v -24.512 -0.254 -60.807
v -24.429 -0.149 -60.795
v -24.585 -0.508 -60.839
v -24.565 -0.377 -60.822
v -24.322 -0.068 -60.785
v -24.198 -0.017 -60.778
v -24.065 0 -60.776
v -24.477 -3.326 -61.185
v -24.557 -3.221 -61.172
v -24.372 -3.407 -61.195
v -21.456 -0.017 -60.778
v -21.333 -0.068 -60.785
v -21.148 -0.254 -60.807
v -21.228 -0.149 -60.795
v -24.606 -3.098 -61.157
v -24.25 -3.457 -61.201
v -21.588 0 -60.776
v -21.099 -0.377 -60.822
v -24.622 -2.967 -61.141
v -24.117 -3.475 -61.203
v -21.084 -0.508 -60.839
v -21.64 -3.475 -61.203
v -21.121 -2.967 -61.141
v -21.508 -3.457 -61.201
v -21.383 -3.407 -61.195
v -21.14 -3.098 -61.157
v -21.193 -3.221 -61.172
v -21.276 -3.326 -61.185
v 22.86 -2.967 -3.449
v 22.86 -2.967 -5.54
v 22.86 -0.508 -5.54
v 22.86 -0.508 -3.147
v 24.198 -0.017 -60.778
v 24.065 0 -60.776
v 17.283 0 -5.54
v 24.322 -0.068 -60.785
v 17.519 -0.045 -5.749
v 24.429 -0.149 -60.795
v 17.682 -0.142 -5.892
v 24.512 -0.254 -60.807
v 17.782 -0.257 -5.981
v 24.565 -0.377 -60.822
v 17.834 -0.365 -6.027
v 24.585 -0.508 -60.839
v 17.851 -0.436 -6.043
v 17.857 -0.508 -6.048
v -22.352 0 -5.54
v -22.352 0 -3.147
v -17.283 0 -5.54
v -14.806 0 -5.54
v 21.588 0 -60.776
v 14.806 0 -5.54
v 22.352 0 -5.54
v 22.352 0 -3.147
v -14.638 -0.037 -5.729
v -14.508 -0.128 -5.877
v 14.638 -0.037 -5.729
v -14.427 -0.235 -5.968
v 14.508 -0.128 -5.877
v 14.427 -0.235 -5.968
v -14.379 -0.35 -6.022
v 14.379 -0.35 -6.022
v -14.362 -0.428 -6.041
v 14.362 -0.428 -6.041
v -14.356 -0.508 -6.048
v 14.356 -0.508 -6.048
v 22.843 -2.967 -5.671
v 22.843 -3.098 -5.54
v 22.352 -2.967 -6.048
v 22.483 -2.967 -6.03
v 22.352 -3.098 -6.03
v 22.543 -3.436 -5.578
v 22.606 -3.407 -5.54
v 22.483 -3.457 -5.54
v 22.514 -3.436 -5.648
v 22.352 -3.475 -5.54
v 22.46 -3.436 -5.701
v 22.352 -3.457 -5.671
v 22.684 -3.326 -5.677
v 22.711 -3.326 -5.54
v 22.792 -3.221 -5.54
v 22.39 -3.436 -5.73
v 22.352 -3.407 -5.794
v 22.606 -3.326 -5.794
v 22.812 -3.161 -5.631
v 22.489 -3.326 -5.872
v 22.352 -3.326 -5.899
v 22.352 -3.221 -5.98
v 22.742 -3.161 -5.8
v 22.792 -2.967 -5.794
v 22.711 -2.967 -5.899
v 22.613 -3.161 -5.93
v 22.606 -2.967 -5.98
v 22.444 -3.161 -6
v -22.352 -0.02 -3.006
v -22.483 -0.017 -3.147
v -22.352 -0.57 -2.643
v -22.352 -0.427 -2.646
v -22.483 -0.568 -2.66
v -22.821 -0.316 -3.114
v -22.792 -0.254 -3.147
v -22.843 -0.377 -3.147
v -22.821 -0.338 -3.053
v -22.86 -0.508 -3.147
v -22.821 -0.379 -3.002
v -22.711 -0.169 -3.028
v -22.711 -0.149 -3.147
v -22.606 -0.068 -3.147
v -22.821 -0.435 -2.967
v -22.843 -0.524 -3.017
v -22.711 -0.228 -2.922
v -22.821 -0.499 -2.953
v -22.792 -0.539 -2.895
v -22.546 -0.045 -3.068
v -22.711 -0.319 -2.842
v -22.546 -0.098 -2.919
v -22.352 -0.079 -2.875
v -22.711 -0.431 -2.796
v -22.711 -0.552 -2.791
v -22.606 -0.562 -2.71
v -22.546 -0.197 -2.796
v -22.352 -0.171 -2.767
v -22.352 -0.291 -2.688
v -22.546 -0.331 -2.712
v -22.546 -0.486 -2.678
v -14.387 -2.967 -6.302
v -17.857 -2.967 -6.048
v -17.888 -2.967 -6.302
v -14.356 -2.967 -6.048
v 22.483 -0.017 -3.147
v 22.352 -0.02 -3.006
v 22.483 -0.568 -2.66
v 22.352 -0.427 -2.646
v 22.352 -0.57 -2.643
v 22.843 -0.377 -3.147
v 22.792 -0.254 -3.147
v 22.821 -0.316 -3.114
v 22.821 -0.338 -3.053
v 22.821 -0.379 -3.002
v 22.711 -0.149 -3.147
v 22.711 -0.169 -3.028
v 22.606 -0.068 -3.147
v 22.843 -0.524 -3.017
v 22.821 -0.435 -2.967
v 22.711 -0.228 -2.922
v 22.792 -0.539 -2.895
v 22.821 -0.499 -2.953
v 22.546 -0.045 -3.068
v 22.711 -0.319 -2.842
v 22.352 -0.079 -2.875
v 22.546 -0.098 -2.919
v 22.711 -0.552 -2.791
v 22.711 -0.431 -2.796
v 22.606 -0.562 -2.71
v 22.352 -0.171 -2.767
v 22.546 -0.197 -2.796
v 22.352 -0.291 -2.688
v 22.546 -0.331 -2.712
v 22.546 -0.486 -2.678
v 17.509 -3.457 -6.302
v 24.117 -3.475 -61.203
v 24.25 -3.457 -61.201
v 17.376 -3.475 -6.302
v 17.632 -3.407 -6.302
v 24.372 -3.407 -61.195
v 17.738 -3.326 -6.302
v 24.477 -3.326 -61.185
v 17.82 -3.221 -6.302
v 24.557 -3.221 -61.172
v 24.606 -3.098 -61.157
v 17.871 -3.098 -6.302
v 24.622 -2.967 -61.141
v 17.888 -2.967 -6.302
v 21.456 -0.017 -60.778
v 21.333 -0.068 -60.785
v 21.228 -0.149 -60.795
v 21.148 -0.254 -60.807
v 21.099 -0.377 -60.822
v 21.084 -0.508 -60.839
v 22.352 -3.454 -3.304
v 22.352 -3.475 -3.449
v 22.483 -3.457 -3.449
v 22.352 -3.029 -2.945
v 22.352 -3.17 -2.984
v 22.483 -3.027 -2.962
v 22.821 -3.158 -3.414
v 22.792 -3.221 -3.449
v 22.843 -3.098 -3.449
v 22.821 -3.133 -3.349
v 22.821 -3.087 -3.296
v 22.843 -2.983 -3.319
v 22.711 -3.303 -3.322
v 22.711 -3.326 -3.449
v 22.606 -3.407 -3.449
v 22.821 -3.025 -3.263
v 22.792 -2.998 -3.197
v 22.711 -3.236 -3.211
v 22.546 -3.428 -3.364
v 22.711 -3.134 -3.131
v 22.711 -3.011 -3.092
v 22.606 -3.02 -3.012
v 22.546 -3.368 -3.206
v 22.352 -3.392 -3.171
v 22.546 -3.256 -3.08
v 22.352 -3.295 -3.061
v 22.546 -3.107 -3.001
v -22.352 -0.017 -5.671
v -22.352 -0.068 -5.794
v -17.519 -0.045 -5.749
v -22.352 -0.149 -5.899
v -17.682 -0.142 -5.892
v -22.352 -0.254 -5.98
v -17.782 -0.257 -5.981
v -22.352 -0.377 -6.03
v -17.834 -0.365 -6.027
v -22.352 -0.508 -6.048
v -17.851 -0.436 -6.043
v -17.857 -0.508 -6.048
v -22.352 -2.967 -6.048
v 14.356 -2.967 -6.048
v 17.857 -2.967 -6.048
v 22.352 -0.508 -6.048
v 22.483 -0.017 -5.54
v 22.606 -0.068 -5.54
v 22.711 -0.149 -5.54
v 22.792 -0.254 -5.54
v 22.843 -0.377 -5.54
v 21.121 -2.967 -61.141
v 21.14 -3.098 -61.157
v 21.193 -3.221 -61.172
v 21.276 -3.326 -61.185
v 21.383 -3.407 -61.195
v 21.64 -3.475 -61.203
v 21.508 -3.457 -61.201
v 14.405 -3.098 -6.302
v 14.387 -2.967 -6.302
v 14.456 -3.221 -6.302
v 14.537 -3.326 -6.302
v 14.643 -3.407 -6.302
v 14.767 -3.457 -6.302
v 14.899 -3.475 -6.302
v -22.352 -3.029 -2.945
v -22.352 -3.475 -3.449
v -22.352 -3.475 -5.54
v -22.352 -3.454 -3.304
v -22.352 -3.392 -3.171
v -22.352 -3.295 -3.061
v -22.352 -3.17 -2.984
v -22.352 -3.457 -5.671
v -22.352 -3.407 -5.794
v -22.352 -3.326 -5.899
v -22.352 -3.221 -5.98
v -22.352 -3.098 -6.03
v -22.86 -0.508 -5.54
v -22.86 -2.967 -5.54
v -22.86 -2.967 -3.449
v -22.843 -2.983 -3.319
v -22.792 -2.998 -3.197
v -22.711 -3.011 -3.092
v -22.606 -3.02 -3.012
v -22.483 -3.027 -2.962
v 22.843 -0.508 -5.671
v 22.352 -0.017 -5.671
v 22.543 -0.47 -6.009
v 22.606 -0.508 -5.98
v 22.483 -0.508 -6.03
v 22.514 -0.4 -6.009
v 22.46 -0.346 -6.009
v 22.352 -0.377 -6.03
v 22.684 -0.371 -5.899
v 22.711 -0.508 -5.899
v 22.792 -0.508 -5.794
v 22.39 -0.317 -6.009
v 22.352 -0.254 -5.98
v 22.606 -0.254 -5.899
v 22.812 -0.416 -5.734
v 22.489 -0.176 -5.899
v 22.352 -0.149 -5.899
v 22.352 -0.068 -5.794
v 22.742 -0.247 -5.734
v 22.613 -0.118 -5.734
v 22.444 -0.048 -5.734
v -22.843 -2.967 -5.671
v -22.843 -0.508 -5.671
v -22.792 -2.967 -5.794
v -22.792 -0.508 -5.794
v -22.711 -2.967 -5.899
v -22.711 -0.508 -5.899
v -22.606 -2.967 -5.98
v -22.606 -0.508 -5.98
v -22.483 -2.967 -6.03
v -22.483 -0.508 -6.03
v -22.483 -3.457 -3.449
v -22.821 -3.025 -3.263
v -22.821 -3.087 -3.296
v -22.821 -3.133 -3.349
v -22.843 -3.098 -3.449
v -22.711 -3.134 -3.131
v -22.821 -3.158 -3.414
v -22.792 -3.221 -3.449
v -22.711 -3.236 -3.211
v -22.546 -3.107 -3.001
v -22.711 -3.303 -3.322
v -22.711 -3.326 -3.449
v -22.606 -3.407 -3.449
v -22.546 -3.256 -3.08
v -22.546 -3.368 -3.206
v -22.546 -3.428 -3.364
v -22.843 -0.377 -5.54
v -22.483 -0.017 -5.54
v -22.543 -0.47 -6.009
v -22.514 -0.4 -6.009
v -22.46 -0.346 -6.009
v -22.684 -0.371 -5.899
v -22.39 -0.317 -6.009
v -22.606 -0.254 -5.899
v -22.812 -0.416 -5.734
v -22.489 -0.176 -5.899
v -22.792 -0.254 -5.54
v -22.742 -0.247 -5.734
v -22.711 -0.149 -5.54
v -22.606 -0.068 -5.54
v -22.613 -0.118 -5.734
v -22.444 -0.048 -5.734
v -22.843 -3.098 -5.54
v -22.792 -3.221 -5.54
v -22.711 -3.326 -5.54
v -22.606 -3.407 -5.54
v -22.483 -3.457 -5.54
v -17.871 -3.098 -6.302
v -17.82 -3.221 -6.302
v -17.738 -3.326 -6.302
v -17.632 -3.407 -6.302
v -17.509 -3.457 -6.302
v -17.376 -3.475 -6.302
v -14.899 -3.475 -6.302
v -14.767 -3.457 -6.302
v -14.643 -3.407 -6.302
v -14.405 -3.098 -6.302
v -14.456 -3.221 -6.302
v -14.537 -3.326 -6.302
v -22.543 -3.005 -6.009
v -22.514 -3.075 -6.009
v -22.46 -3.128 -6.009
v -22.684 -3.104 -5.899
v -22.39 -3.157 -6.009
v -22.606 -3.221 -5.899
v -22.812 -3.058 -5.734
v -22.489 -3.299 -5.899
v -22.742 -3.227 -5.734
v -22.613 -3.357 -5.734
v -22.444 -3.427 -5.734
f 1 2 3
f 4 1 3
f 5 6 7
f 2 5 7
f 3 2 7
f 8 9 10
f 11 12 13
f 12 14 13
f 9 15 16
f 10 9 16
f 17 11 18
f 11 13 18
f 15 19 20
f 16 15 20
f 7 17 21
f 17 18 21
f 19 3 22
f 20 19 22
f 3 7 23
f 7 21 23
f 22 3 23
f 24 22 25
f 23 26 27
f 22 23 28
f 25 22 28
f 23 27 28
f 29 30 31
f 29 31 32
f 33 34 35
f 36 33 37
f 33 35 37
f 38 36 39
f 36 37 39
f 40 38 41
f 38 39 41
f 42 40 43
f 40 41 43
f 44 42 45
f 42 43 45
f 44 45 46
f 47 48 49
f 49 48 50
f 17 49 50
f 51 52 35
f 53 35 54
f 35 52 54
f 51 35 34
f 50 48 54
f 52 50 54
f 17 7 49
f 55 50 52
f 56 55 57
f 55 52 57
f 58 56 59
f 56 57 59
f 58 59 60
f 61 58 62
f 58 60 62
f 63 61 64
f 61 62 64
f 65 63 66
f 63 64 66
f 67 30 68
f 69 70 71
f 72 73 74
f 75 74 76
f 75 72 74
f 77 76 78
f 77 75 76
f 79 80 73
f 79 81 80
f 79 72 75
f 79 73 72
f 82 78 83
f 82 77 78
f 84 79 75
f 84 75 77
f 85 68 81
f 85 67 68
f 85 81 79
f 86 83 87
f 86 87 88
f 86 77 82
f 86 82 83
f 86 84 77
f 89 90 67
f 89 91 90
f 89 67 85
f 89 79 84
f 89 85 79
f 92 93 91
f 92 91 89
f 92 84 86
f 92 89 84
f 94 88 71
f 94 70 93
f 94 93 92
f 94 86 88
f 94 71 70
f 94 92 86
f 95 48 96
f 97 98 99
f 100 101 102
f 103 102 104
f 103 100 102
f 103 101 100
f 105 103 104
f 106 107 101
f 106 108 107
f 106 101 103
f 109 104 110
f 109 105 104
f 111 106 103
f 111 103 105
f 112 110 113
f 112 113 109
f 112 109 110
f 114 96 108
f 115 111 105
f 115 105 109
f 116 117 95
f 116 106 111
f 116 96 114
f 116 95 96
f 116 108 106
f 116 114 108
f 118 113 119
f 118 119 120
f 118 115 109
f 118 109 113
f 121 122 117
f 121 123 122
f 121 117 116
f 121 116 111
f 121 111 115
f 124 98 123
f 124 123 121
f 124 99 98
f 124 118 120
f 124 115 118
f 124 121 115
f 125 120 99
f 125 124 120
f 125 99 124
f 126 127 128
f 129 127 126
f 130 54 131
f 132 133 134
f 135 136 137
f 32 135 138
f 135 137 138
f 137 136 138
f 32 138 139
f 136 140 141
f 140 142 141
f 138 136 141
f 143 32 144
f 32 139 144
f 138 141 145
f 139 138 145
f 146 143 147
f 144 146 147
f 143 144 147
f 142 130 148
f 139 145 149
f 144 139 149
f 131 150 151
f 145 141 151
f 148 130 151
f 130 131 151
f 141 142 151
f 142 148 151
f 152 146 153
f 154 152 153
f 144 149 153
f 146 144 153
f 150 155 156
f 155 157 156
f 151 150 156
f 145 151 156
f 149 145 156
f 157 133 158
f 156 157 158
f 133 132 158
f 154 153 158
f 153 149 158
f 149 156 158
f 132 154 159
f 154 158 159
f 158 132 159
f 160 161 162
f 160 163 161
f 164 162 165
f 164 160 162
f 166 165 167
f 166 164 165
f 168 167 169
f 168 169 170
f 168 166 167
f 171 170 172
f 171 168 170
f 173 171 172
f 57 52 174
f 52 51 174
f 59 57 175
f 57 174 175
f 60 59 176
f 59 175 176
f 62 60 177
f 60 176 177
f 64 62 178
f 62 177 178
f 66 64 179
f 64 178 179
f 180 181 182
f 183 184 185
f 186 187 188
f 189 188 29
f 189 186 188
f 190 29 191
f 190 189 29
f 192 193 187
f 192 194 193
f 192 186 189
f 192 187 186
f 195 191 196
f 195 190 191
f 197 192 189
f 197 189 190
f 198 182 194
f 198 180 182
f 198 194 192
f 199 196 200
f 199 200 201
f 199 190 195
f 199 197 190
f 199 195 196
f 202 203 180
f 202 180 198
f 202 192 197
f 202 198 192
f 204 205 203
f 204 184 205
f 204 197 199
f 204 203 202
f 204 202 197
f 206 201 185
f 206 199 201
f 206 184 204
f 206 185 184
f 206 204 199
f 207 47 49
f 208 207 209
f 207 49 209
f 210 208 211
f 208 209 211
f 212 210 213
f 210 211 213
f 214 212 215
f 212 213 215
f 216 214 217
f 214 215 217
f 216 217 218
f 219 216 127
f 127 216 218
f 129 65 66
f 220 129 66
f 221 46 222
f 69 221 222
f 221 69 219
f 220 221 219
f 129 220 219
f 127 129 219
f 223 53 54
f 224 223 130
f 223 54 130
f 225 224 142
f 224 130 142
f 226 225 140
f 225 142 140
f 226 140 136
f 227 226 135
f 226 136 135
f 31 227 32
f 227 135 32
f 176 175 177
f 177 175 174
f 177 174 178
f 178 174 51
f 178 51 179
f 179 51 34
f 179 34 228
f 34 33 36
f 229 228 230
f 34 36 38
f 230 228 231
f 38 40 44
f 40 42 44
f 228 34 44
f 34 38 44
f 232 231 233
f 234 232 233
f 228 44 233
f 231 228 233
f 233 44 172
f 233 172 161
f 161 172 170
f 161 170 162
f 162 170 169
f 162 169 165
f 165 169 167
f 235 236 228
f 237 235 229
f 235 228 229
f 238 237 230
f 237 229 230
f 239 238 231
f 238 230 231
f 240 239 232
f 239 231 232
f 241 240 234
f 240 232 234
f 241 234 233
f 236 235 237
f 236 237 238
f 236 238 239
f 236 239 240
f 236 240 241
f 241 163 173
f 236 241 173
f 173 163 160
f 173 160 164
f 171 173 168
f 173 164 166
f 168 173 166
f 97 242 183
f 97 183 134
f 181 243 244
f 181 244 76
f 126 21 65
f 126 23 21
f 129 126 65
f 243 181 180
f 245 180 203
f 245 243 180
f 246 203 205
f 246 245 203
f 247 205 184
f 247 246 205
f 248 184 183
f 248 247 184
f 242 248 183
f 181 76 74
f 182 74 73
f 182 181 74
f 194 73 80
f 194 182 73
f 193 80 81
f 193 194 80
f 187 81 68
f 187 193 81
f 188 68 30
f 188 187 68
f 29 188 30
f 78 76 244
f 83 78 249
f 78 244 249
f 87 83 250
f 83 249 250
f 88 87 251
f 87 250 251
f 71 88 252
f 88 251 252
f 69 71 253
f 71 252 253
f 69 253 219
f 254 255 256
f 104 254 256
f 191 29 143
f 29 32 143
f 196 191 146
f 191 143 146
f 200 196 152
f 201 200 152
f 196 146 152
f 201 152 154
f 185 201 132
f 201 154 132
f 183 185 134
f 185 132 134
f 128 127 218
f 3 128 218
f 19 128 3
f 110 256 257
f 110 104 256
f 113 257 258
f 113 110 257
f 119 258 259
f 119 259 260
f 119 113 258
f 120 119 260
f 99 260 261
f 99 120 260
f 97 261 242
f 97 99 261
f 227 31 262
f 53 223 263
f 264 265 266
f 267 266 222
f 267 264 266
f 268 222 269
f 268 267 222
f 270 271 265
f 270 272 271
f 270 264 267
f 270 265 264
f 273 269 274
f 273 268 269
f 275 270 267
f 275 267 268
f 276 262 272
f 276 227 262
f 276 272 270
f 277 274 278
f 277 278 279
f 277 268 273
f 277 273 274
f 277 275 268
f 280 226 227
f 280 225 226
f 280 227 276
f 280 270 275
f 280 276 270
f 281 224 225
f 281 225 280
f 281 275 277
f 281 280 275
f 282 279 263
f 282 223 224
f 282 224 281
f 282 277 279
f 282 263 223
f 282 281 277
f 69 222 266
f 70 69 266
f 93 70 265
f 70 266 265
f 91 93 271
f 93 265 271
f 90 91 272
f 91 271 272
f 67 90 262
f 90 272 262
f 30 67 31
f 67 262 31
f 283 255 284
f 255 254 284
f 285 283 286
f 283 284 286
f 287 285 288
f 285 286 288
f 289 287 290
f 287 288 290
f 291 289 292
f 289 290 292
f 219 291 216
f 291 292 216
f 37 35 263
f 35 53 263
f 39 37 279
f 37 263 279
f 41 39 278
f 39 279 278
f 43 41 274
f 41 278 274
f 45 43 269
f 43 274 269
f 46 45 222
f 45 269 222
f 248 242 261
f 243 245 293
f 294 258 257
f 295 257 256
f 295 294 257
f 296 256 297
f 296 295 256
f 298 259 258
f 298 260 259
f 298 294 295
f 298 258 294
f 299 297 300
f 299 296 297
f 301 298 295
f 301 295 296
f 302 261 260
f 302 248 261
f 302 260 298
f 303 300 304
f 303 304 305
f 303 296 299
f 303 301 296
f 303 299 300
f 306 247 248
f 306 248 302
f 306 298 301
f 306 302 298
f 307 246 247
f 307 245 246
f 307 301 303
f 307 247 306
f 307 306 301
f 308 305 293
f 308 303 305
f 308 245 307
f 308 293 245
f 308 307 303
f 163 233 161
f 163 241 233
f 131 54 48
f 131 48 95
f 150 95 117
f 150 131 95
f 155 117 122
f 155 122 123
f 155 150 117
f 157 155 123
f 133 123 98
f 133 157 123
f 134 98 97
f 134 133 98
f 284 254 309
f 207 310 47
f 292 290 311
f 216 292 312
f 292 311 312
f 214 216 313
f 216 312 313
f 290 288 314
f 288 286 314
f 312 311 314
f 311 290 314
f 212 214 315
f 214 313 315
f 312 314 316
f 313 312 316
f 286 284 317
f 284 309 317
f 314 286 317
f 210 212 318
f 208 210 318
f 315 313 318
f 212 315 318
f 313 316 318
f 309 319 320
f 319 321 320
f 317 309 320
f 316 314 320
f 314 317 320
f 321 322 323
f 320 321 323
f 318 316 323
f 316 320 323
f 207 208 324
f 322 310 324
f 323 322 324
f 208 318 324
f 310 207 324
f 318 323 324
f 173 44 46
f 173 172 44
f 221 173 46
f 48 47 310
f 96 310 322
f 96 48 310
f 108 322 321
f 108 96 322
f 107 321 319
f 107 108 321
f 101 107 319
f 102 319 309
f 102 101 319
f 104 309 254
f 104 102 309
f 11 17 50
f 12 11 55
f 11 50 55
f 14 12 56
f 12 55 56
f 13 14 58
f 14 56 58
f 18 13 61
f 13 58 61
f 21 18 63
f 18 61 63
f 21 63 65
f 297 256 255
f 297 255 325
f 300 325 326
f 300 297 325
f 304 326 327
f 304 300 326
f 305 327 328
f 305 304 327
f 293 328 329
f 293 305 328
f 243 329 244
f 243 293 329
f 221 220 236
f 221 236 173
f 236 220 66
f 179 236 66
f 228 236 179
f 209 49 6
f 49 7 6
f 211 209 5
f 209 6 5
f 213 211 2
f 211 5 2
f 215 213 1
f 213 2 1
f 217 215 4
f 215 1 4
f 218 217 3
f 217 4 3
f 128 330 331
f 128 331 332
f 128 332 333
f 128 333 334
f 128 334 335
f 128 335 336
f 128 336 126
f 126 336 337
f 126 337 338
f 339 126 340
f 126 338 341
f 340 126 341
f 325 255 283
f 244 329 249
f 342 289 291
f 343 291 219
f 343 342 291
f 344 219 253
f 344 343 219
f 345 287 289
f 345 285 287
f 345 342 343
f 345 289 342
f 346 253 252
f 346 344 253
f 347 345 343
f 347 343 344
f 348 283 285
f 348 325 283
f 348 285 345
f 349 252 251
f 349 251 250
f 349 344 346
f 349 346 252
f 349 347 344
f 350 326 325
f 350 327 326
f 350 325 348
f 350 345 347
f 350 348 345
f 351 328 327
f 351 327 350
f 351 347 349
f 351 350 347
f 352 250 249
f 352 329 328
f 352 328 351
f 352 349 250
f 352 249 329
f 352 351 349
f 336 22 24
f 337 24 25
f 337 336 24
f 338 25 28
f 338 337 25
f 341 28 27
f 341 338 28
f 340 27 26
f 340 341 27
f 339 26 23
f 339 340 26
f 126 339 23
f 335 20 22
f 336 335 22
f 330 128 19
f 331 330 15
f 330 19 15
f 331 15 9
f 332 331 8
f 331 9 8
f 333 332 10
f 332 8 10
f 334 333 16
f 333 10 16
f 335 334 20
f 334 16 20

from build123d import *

# Parameters (mm, degrees)
F0_W     = 45.72
F0_H     = 3.47472
F1_DEPTH = 3.47472
F3_DEPTH = 3.47472
F5_DEPTH = 38.1
F6_W     = 45.72
F6_H     = 0.254
F7_DEPTH = 0.508
F8_R     = 0.50799


# Not quite as in the source:
# - a fillet or chamfer is up to 0.001 mm smaller than in the source, because OpenCascade refuses the exact size


with BuildPart() as f1:
    # F0 (on Front) → F1 (new body)
    with BuildSketch(Plane.XZ):
        with Locations((0, -4.3103059118)):
            Rectangle(F0_W, F0_H)
    extrude(amount=F1_DEPTH)

    # F2 (on face) → F3 (join)
    with BuildSketch(Plane.XZ.offset(3.47472)):
        Polygon((-13.929602997, -2.5729459118), (-17.4304175377, -2.5729459118), (-24.6292689013, -61.2028853004), (-21.1804489373, -61.6263471453), align=None)
        Polygon((21.1804489373, -61.6263471453), (24.6292689013, -61.2028853004), (17.4304175377, -2.5729459118), (13.929602997, -2.5729459118), align=None)
    extrude(amount=-F3_DEPTH)

    # F4 (on Right) → F5 (cut, symmetric)
    with BuildSketch(Plane.YZ):
        Polygon((-3.47472, -2.9995878813), (0, -2.5729459118), (-3.47472, -2.5729459118), align=None)
        Polygon((0, -60.7762433309), (-3.47472, -61.2028853004), (-3.47472, -61.962287873), (0, -61.962287873), align=None)
    extrude(amount=F5_DEPTH, both=True, mode=Mode.SUBTRACT)

    # F6 (on face) → F7 (cut)
    with BuildSketch(Plane.XZ.offset(3.47472)):
        with Locations((0, -6.1746659118)):
            Rectangle(F6_W, F6_H)
    extrude(amount=-F7_DEPTH, mode=Mode.SUBTRACT)

    # F8 (radius 0.508 in the source; OpenCascade refuses exactly that, so slightly less here)
    f8_edges = [f1.edges().sort_by_distance(p)[0] for p in [
        (0, -3.47472, -2.999588),
        (22.86, 0, -4.310306),
        (22.86, -1.73736, -6.047666),
        (22.86, -3.47472, -4.523627),
        (22.86, -1.73736, -2.786267),
        (21.258758, -3.47472, -33.752276),
        (-17.757943, -3.47472, -33.752276),
        (-21.258758, -3.47472, -33.752276),
        (-22.86, 0, -4.310306),
        (-22.86, -1.73736, -2.786267),
        (-22.86, -3.47472, -4.523627),
        (-22.86, -1.73736, -6.047666),
        (17.757943, -3.47472, -33.752276),
        (20.35853, 0, -6.047666),
        (17.716157, 0, -33.411955),
        (0, 0, -6.047666),
        (-20.35853, 0, -6.047666),
        (-21.216972, 0, -33.411955),
        (-17.716157, 0, -33.411955),
        (21.216972, 0, -33.411955),
        (0, -3.47472, -6.047666),
        (0, 0, -2.572946),
    ]]
    fillet(f8_edges, radius=F8_R)


solid = f1.part
